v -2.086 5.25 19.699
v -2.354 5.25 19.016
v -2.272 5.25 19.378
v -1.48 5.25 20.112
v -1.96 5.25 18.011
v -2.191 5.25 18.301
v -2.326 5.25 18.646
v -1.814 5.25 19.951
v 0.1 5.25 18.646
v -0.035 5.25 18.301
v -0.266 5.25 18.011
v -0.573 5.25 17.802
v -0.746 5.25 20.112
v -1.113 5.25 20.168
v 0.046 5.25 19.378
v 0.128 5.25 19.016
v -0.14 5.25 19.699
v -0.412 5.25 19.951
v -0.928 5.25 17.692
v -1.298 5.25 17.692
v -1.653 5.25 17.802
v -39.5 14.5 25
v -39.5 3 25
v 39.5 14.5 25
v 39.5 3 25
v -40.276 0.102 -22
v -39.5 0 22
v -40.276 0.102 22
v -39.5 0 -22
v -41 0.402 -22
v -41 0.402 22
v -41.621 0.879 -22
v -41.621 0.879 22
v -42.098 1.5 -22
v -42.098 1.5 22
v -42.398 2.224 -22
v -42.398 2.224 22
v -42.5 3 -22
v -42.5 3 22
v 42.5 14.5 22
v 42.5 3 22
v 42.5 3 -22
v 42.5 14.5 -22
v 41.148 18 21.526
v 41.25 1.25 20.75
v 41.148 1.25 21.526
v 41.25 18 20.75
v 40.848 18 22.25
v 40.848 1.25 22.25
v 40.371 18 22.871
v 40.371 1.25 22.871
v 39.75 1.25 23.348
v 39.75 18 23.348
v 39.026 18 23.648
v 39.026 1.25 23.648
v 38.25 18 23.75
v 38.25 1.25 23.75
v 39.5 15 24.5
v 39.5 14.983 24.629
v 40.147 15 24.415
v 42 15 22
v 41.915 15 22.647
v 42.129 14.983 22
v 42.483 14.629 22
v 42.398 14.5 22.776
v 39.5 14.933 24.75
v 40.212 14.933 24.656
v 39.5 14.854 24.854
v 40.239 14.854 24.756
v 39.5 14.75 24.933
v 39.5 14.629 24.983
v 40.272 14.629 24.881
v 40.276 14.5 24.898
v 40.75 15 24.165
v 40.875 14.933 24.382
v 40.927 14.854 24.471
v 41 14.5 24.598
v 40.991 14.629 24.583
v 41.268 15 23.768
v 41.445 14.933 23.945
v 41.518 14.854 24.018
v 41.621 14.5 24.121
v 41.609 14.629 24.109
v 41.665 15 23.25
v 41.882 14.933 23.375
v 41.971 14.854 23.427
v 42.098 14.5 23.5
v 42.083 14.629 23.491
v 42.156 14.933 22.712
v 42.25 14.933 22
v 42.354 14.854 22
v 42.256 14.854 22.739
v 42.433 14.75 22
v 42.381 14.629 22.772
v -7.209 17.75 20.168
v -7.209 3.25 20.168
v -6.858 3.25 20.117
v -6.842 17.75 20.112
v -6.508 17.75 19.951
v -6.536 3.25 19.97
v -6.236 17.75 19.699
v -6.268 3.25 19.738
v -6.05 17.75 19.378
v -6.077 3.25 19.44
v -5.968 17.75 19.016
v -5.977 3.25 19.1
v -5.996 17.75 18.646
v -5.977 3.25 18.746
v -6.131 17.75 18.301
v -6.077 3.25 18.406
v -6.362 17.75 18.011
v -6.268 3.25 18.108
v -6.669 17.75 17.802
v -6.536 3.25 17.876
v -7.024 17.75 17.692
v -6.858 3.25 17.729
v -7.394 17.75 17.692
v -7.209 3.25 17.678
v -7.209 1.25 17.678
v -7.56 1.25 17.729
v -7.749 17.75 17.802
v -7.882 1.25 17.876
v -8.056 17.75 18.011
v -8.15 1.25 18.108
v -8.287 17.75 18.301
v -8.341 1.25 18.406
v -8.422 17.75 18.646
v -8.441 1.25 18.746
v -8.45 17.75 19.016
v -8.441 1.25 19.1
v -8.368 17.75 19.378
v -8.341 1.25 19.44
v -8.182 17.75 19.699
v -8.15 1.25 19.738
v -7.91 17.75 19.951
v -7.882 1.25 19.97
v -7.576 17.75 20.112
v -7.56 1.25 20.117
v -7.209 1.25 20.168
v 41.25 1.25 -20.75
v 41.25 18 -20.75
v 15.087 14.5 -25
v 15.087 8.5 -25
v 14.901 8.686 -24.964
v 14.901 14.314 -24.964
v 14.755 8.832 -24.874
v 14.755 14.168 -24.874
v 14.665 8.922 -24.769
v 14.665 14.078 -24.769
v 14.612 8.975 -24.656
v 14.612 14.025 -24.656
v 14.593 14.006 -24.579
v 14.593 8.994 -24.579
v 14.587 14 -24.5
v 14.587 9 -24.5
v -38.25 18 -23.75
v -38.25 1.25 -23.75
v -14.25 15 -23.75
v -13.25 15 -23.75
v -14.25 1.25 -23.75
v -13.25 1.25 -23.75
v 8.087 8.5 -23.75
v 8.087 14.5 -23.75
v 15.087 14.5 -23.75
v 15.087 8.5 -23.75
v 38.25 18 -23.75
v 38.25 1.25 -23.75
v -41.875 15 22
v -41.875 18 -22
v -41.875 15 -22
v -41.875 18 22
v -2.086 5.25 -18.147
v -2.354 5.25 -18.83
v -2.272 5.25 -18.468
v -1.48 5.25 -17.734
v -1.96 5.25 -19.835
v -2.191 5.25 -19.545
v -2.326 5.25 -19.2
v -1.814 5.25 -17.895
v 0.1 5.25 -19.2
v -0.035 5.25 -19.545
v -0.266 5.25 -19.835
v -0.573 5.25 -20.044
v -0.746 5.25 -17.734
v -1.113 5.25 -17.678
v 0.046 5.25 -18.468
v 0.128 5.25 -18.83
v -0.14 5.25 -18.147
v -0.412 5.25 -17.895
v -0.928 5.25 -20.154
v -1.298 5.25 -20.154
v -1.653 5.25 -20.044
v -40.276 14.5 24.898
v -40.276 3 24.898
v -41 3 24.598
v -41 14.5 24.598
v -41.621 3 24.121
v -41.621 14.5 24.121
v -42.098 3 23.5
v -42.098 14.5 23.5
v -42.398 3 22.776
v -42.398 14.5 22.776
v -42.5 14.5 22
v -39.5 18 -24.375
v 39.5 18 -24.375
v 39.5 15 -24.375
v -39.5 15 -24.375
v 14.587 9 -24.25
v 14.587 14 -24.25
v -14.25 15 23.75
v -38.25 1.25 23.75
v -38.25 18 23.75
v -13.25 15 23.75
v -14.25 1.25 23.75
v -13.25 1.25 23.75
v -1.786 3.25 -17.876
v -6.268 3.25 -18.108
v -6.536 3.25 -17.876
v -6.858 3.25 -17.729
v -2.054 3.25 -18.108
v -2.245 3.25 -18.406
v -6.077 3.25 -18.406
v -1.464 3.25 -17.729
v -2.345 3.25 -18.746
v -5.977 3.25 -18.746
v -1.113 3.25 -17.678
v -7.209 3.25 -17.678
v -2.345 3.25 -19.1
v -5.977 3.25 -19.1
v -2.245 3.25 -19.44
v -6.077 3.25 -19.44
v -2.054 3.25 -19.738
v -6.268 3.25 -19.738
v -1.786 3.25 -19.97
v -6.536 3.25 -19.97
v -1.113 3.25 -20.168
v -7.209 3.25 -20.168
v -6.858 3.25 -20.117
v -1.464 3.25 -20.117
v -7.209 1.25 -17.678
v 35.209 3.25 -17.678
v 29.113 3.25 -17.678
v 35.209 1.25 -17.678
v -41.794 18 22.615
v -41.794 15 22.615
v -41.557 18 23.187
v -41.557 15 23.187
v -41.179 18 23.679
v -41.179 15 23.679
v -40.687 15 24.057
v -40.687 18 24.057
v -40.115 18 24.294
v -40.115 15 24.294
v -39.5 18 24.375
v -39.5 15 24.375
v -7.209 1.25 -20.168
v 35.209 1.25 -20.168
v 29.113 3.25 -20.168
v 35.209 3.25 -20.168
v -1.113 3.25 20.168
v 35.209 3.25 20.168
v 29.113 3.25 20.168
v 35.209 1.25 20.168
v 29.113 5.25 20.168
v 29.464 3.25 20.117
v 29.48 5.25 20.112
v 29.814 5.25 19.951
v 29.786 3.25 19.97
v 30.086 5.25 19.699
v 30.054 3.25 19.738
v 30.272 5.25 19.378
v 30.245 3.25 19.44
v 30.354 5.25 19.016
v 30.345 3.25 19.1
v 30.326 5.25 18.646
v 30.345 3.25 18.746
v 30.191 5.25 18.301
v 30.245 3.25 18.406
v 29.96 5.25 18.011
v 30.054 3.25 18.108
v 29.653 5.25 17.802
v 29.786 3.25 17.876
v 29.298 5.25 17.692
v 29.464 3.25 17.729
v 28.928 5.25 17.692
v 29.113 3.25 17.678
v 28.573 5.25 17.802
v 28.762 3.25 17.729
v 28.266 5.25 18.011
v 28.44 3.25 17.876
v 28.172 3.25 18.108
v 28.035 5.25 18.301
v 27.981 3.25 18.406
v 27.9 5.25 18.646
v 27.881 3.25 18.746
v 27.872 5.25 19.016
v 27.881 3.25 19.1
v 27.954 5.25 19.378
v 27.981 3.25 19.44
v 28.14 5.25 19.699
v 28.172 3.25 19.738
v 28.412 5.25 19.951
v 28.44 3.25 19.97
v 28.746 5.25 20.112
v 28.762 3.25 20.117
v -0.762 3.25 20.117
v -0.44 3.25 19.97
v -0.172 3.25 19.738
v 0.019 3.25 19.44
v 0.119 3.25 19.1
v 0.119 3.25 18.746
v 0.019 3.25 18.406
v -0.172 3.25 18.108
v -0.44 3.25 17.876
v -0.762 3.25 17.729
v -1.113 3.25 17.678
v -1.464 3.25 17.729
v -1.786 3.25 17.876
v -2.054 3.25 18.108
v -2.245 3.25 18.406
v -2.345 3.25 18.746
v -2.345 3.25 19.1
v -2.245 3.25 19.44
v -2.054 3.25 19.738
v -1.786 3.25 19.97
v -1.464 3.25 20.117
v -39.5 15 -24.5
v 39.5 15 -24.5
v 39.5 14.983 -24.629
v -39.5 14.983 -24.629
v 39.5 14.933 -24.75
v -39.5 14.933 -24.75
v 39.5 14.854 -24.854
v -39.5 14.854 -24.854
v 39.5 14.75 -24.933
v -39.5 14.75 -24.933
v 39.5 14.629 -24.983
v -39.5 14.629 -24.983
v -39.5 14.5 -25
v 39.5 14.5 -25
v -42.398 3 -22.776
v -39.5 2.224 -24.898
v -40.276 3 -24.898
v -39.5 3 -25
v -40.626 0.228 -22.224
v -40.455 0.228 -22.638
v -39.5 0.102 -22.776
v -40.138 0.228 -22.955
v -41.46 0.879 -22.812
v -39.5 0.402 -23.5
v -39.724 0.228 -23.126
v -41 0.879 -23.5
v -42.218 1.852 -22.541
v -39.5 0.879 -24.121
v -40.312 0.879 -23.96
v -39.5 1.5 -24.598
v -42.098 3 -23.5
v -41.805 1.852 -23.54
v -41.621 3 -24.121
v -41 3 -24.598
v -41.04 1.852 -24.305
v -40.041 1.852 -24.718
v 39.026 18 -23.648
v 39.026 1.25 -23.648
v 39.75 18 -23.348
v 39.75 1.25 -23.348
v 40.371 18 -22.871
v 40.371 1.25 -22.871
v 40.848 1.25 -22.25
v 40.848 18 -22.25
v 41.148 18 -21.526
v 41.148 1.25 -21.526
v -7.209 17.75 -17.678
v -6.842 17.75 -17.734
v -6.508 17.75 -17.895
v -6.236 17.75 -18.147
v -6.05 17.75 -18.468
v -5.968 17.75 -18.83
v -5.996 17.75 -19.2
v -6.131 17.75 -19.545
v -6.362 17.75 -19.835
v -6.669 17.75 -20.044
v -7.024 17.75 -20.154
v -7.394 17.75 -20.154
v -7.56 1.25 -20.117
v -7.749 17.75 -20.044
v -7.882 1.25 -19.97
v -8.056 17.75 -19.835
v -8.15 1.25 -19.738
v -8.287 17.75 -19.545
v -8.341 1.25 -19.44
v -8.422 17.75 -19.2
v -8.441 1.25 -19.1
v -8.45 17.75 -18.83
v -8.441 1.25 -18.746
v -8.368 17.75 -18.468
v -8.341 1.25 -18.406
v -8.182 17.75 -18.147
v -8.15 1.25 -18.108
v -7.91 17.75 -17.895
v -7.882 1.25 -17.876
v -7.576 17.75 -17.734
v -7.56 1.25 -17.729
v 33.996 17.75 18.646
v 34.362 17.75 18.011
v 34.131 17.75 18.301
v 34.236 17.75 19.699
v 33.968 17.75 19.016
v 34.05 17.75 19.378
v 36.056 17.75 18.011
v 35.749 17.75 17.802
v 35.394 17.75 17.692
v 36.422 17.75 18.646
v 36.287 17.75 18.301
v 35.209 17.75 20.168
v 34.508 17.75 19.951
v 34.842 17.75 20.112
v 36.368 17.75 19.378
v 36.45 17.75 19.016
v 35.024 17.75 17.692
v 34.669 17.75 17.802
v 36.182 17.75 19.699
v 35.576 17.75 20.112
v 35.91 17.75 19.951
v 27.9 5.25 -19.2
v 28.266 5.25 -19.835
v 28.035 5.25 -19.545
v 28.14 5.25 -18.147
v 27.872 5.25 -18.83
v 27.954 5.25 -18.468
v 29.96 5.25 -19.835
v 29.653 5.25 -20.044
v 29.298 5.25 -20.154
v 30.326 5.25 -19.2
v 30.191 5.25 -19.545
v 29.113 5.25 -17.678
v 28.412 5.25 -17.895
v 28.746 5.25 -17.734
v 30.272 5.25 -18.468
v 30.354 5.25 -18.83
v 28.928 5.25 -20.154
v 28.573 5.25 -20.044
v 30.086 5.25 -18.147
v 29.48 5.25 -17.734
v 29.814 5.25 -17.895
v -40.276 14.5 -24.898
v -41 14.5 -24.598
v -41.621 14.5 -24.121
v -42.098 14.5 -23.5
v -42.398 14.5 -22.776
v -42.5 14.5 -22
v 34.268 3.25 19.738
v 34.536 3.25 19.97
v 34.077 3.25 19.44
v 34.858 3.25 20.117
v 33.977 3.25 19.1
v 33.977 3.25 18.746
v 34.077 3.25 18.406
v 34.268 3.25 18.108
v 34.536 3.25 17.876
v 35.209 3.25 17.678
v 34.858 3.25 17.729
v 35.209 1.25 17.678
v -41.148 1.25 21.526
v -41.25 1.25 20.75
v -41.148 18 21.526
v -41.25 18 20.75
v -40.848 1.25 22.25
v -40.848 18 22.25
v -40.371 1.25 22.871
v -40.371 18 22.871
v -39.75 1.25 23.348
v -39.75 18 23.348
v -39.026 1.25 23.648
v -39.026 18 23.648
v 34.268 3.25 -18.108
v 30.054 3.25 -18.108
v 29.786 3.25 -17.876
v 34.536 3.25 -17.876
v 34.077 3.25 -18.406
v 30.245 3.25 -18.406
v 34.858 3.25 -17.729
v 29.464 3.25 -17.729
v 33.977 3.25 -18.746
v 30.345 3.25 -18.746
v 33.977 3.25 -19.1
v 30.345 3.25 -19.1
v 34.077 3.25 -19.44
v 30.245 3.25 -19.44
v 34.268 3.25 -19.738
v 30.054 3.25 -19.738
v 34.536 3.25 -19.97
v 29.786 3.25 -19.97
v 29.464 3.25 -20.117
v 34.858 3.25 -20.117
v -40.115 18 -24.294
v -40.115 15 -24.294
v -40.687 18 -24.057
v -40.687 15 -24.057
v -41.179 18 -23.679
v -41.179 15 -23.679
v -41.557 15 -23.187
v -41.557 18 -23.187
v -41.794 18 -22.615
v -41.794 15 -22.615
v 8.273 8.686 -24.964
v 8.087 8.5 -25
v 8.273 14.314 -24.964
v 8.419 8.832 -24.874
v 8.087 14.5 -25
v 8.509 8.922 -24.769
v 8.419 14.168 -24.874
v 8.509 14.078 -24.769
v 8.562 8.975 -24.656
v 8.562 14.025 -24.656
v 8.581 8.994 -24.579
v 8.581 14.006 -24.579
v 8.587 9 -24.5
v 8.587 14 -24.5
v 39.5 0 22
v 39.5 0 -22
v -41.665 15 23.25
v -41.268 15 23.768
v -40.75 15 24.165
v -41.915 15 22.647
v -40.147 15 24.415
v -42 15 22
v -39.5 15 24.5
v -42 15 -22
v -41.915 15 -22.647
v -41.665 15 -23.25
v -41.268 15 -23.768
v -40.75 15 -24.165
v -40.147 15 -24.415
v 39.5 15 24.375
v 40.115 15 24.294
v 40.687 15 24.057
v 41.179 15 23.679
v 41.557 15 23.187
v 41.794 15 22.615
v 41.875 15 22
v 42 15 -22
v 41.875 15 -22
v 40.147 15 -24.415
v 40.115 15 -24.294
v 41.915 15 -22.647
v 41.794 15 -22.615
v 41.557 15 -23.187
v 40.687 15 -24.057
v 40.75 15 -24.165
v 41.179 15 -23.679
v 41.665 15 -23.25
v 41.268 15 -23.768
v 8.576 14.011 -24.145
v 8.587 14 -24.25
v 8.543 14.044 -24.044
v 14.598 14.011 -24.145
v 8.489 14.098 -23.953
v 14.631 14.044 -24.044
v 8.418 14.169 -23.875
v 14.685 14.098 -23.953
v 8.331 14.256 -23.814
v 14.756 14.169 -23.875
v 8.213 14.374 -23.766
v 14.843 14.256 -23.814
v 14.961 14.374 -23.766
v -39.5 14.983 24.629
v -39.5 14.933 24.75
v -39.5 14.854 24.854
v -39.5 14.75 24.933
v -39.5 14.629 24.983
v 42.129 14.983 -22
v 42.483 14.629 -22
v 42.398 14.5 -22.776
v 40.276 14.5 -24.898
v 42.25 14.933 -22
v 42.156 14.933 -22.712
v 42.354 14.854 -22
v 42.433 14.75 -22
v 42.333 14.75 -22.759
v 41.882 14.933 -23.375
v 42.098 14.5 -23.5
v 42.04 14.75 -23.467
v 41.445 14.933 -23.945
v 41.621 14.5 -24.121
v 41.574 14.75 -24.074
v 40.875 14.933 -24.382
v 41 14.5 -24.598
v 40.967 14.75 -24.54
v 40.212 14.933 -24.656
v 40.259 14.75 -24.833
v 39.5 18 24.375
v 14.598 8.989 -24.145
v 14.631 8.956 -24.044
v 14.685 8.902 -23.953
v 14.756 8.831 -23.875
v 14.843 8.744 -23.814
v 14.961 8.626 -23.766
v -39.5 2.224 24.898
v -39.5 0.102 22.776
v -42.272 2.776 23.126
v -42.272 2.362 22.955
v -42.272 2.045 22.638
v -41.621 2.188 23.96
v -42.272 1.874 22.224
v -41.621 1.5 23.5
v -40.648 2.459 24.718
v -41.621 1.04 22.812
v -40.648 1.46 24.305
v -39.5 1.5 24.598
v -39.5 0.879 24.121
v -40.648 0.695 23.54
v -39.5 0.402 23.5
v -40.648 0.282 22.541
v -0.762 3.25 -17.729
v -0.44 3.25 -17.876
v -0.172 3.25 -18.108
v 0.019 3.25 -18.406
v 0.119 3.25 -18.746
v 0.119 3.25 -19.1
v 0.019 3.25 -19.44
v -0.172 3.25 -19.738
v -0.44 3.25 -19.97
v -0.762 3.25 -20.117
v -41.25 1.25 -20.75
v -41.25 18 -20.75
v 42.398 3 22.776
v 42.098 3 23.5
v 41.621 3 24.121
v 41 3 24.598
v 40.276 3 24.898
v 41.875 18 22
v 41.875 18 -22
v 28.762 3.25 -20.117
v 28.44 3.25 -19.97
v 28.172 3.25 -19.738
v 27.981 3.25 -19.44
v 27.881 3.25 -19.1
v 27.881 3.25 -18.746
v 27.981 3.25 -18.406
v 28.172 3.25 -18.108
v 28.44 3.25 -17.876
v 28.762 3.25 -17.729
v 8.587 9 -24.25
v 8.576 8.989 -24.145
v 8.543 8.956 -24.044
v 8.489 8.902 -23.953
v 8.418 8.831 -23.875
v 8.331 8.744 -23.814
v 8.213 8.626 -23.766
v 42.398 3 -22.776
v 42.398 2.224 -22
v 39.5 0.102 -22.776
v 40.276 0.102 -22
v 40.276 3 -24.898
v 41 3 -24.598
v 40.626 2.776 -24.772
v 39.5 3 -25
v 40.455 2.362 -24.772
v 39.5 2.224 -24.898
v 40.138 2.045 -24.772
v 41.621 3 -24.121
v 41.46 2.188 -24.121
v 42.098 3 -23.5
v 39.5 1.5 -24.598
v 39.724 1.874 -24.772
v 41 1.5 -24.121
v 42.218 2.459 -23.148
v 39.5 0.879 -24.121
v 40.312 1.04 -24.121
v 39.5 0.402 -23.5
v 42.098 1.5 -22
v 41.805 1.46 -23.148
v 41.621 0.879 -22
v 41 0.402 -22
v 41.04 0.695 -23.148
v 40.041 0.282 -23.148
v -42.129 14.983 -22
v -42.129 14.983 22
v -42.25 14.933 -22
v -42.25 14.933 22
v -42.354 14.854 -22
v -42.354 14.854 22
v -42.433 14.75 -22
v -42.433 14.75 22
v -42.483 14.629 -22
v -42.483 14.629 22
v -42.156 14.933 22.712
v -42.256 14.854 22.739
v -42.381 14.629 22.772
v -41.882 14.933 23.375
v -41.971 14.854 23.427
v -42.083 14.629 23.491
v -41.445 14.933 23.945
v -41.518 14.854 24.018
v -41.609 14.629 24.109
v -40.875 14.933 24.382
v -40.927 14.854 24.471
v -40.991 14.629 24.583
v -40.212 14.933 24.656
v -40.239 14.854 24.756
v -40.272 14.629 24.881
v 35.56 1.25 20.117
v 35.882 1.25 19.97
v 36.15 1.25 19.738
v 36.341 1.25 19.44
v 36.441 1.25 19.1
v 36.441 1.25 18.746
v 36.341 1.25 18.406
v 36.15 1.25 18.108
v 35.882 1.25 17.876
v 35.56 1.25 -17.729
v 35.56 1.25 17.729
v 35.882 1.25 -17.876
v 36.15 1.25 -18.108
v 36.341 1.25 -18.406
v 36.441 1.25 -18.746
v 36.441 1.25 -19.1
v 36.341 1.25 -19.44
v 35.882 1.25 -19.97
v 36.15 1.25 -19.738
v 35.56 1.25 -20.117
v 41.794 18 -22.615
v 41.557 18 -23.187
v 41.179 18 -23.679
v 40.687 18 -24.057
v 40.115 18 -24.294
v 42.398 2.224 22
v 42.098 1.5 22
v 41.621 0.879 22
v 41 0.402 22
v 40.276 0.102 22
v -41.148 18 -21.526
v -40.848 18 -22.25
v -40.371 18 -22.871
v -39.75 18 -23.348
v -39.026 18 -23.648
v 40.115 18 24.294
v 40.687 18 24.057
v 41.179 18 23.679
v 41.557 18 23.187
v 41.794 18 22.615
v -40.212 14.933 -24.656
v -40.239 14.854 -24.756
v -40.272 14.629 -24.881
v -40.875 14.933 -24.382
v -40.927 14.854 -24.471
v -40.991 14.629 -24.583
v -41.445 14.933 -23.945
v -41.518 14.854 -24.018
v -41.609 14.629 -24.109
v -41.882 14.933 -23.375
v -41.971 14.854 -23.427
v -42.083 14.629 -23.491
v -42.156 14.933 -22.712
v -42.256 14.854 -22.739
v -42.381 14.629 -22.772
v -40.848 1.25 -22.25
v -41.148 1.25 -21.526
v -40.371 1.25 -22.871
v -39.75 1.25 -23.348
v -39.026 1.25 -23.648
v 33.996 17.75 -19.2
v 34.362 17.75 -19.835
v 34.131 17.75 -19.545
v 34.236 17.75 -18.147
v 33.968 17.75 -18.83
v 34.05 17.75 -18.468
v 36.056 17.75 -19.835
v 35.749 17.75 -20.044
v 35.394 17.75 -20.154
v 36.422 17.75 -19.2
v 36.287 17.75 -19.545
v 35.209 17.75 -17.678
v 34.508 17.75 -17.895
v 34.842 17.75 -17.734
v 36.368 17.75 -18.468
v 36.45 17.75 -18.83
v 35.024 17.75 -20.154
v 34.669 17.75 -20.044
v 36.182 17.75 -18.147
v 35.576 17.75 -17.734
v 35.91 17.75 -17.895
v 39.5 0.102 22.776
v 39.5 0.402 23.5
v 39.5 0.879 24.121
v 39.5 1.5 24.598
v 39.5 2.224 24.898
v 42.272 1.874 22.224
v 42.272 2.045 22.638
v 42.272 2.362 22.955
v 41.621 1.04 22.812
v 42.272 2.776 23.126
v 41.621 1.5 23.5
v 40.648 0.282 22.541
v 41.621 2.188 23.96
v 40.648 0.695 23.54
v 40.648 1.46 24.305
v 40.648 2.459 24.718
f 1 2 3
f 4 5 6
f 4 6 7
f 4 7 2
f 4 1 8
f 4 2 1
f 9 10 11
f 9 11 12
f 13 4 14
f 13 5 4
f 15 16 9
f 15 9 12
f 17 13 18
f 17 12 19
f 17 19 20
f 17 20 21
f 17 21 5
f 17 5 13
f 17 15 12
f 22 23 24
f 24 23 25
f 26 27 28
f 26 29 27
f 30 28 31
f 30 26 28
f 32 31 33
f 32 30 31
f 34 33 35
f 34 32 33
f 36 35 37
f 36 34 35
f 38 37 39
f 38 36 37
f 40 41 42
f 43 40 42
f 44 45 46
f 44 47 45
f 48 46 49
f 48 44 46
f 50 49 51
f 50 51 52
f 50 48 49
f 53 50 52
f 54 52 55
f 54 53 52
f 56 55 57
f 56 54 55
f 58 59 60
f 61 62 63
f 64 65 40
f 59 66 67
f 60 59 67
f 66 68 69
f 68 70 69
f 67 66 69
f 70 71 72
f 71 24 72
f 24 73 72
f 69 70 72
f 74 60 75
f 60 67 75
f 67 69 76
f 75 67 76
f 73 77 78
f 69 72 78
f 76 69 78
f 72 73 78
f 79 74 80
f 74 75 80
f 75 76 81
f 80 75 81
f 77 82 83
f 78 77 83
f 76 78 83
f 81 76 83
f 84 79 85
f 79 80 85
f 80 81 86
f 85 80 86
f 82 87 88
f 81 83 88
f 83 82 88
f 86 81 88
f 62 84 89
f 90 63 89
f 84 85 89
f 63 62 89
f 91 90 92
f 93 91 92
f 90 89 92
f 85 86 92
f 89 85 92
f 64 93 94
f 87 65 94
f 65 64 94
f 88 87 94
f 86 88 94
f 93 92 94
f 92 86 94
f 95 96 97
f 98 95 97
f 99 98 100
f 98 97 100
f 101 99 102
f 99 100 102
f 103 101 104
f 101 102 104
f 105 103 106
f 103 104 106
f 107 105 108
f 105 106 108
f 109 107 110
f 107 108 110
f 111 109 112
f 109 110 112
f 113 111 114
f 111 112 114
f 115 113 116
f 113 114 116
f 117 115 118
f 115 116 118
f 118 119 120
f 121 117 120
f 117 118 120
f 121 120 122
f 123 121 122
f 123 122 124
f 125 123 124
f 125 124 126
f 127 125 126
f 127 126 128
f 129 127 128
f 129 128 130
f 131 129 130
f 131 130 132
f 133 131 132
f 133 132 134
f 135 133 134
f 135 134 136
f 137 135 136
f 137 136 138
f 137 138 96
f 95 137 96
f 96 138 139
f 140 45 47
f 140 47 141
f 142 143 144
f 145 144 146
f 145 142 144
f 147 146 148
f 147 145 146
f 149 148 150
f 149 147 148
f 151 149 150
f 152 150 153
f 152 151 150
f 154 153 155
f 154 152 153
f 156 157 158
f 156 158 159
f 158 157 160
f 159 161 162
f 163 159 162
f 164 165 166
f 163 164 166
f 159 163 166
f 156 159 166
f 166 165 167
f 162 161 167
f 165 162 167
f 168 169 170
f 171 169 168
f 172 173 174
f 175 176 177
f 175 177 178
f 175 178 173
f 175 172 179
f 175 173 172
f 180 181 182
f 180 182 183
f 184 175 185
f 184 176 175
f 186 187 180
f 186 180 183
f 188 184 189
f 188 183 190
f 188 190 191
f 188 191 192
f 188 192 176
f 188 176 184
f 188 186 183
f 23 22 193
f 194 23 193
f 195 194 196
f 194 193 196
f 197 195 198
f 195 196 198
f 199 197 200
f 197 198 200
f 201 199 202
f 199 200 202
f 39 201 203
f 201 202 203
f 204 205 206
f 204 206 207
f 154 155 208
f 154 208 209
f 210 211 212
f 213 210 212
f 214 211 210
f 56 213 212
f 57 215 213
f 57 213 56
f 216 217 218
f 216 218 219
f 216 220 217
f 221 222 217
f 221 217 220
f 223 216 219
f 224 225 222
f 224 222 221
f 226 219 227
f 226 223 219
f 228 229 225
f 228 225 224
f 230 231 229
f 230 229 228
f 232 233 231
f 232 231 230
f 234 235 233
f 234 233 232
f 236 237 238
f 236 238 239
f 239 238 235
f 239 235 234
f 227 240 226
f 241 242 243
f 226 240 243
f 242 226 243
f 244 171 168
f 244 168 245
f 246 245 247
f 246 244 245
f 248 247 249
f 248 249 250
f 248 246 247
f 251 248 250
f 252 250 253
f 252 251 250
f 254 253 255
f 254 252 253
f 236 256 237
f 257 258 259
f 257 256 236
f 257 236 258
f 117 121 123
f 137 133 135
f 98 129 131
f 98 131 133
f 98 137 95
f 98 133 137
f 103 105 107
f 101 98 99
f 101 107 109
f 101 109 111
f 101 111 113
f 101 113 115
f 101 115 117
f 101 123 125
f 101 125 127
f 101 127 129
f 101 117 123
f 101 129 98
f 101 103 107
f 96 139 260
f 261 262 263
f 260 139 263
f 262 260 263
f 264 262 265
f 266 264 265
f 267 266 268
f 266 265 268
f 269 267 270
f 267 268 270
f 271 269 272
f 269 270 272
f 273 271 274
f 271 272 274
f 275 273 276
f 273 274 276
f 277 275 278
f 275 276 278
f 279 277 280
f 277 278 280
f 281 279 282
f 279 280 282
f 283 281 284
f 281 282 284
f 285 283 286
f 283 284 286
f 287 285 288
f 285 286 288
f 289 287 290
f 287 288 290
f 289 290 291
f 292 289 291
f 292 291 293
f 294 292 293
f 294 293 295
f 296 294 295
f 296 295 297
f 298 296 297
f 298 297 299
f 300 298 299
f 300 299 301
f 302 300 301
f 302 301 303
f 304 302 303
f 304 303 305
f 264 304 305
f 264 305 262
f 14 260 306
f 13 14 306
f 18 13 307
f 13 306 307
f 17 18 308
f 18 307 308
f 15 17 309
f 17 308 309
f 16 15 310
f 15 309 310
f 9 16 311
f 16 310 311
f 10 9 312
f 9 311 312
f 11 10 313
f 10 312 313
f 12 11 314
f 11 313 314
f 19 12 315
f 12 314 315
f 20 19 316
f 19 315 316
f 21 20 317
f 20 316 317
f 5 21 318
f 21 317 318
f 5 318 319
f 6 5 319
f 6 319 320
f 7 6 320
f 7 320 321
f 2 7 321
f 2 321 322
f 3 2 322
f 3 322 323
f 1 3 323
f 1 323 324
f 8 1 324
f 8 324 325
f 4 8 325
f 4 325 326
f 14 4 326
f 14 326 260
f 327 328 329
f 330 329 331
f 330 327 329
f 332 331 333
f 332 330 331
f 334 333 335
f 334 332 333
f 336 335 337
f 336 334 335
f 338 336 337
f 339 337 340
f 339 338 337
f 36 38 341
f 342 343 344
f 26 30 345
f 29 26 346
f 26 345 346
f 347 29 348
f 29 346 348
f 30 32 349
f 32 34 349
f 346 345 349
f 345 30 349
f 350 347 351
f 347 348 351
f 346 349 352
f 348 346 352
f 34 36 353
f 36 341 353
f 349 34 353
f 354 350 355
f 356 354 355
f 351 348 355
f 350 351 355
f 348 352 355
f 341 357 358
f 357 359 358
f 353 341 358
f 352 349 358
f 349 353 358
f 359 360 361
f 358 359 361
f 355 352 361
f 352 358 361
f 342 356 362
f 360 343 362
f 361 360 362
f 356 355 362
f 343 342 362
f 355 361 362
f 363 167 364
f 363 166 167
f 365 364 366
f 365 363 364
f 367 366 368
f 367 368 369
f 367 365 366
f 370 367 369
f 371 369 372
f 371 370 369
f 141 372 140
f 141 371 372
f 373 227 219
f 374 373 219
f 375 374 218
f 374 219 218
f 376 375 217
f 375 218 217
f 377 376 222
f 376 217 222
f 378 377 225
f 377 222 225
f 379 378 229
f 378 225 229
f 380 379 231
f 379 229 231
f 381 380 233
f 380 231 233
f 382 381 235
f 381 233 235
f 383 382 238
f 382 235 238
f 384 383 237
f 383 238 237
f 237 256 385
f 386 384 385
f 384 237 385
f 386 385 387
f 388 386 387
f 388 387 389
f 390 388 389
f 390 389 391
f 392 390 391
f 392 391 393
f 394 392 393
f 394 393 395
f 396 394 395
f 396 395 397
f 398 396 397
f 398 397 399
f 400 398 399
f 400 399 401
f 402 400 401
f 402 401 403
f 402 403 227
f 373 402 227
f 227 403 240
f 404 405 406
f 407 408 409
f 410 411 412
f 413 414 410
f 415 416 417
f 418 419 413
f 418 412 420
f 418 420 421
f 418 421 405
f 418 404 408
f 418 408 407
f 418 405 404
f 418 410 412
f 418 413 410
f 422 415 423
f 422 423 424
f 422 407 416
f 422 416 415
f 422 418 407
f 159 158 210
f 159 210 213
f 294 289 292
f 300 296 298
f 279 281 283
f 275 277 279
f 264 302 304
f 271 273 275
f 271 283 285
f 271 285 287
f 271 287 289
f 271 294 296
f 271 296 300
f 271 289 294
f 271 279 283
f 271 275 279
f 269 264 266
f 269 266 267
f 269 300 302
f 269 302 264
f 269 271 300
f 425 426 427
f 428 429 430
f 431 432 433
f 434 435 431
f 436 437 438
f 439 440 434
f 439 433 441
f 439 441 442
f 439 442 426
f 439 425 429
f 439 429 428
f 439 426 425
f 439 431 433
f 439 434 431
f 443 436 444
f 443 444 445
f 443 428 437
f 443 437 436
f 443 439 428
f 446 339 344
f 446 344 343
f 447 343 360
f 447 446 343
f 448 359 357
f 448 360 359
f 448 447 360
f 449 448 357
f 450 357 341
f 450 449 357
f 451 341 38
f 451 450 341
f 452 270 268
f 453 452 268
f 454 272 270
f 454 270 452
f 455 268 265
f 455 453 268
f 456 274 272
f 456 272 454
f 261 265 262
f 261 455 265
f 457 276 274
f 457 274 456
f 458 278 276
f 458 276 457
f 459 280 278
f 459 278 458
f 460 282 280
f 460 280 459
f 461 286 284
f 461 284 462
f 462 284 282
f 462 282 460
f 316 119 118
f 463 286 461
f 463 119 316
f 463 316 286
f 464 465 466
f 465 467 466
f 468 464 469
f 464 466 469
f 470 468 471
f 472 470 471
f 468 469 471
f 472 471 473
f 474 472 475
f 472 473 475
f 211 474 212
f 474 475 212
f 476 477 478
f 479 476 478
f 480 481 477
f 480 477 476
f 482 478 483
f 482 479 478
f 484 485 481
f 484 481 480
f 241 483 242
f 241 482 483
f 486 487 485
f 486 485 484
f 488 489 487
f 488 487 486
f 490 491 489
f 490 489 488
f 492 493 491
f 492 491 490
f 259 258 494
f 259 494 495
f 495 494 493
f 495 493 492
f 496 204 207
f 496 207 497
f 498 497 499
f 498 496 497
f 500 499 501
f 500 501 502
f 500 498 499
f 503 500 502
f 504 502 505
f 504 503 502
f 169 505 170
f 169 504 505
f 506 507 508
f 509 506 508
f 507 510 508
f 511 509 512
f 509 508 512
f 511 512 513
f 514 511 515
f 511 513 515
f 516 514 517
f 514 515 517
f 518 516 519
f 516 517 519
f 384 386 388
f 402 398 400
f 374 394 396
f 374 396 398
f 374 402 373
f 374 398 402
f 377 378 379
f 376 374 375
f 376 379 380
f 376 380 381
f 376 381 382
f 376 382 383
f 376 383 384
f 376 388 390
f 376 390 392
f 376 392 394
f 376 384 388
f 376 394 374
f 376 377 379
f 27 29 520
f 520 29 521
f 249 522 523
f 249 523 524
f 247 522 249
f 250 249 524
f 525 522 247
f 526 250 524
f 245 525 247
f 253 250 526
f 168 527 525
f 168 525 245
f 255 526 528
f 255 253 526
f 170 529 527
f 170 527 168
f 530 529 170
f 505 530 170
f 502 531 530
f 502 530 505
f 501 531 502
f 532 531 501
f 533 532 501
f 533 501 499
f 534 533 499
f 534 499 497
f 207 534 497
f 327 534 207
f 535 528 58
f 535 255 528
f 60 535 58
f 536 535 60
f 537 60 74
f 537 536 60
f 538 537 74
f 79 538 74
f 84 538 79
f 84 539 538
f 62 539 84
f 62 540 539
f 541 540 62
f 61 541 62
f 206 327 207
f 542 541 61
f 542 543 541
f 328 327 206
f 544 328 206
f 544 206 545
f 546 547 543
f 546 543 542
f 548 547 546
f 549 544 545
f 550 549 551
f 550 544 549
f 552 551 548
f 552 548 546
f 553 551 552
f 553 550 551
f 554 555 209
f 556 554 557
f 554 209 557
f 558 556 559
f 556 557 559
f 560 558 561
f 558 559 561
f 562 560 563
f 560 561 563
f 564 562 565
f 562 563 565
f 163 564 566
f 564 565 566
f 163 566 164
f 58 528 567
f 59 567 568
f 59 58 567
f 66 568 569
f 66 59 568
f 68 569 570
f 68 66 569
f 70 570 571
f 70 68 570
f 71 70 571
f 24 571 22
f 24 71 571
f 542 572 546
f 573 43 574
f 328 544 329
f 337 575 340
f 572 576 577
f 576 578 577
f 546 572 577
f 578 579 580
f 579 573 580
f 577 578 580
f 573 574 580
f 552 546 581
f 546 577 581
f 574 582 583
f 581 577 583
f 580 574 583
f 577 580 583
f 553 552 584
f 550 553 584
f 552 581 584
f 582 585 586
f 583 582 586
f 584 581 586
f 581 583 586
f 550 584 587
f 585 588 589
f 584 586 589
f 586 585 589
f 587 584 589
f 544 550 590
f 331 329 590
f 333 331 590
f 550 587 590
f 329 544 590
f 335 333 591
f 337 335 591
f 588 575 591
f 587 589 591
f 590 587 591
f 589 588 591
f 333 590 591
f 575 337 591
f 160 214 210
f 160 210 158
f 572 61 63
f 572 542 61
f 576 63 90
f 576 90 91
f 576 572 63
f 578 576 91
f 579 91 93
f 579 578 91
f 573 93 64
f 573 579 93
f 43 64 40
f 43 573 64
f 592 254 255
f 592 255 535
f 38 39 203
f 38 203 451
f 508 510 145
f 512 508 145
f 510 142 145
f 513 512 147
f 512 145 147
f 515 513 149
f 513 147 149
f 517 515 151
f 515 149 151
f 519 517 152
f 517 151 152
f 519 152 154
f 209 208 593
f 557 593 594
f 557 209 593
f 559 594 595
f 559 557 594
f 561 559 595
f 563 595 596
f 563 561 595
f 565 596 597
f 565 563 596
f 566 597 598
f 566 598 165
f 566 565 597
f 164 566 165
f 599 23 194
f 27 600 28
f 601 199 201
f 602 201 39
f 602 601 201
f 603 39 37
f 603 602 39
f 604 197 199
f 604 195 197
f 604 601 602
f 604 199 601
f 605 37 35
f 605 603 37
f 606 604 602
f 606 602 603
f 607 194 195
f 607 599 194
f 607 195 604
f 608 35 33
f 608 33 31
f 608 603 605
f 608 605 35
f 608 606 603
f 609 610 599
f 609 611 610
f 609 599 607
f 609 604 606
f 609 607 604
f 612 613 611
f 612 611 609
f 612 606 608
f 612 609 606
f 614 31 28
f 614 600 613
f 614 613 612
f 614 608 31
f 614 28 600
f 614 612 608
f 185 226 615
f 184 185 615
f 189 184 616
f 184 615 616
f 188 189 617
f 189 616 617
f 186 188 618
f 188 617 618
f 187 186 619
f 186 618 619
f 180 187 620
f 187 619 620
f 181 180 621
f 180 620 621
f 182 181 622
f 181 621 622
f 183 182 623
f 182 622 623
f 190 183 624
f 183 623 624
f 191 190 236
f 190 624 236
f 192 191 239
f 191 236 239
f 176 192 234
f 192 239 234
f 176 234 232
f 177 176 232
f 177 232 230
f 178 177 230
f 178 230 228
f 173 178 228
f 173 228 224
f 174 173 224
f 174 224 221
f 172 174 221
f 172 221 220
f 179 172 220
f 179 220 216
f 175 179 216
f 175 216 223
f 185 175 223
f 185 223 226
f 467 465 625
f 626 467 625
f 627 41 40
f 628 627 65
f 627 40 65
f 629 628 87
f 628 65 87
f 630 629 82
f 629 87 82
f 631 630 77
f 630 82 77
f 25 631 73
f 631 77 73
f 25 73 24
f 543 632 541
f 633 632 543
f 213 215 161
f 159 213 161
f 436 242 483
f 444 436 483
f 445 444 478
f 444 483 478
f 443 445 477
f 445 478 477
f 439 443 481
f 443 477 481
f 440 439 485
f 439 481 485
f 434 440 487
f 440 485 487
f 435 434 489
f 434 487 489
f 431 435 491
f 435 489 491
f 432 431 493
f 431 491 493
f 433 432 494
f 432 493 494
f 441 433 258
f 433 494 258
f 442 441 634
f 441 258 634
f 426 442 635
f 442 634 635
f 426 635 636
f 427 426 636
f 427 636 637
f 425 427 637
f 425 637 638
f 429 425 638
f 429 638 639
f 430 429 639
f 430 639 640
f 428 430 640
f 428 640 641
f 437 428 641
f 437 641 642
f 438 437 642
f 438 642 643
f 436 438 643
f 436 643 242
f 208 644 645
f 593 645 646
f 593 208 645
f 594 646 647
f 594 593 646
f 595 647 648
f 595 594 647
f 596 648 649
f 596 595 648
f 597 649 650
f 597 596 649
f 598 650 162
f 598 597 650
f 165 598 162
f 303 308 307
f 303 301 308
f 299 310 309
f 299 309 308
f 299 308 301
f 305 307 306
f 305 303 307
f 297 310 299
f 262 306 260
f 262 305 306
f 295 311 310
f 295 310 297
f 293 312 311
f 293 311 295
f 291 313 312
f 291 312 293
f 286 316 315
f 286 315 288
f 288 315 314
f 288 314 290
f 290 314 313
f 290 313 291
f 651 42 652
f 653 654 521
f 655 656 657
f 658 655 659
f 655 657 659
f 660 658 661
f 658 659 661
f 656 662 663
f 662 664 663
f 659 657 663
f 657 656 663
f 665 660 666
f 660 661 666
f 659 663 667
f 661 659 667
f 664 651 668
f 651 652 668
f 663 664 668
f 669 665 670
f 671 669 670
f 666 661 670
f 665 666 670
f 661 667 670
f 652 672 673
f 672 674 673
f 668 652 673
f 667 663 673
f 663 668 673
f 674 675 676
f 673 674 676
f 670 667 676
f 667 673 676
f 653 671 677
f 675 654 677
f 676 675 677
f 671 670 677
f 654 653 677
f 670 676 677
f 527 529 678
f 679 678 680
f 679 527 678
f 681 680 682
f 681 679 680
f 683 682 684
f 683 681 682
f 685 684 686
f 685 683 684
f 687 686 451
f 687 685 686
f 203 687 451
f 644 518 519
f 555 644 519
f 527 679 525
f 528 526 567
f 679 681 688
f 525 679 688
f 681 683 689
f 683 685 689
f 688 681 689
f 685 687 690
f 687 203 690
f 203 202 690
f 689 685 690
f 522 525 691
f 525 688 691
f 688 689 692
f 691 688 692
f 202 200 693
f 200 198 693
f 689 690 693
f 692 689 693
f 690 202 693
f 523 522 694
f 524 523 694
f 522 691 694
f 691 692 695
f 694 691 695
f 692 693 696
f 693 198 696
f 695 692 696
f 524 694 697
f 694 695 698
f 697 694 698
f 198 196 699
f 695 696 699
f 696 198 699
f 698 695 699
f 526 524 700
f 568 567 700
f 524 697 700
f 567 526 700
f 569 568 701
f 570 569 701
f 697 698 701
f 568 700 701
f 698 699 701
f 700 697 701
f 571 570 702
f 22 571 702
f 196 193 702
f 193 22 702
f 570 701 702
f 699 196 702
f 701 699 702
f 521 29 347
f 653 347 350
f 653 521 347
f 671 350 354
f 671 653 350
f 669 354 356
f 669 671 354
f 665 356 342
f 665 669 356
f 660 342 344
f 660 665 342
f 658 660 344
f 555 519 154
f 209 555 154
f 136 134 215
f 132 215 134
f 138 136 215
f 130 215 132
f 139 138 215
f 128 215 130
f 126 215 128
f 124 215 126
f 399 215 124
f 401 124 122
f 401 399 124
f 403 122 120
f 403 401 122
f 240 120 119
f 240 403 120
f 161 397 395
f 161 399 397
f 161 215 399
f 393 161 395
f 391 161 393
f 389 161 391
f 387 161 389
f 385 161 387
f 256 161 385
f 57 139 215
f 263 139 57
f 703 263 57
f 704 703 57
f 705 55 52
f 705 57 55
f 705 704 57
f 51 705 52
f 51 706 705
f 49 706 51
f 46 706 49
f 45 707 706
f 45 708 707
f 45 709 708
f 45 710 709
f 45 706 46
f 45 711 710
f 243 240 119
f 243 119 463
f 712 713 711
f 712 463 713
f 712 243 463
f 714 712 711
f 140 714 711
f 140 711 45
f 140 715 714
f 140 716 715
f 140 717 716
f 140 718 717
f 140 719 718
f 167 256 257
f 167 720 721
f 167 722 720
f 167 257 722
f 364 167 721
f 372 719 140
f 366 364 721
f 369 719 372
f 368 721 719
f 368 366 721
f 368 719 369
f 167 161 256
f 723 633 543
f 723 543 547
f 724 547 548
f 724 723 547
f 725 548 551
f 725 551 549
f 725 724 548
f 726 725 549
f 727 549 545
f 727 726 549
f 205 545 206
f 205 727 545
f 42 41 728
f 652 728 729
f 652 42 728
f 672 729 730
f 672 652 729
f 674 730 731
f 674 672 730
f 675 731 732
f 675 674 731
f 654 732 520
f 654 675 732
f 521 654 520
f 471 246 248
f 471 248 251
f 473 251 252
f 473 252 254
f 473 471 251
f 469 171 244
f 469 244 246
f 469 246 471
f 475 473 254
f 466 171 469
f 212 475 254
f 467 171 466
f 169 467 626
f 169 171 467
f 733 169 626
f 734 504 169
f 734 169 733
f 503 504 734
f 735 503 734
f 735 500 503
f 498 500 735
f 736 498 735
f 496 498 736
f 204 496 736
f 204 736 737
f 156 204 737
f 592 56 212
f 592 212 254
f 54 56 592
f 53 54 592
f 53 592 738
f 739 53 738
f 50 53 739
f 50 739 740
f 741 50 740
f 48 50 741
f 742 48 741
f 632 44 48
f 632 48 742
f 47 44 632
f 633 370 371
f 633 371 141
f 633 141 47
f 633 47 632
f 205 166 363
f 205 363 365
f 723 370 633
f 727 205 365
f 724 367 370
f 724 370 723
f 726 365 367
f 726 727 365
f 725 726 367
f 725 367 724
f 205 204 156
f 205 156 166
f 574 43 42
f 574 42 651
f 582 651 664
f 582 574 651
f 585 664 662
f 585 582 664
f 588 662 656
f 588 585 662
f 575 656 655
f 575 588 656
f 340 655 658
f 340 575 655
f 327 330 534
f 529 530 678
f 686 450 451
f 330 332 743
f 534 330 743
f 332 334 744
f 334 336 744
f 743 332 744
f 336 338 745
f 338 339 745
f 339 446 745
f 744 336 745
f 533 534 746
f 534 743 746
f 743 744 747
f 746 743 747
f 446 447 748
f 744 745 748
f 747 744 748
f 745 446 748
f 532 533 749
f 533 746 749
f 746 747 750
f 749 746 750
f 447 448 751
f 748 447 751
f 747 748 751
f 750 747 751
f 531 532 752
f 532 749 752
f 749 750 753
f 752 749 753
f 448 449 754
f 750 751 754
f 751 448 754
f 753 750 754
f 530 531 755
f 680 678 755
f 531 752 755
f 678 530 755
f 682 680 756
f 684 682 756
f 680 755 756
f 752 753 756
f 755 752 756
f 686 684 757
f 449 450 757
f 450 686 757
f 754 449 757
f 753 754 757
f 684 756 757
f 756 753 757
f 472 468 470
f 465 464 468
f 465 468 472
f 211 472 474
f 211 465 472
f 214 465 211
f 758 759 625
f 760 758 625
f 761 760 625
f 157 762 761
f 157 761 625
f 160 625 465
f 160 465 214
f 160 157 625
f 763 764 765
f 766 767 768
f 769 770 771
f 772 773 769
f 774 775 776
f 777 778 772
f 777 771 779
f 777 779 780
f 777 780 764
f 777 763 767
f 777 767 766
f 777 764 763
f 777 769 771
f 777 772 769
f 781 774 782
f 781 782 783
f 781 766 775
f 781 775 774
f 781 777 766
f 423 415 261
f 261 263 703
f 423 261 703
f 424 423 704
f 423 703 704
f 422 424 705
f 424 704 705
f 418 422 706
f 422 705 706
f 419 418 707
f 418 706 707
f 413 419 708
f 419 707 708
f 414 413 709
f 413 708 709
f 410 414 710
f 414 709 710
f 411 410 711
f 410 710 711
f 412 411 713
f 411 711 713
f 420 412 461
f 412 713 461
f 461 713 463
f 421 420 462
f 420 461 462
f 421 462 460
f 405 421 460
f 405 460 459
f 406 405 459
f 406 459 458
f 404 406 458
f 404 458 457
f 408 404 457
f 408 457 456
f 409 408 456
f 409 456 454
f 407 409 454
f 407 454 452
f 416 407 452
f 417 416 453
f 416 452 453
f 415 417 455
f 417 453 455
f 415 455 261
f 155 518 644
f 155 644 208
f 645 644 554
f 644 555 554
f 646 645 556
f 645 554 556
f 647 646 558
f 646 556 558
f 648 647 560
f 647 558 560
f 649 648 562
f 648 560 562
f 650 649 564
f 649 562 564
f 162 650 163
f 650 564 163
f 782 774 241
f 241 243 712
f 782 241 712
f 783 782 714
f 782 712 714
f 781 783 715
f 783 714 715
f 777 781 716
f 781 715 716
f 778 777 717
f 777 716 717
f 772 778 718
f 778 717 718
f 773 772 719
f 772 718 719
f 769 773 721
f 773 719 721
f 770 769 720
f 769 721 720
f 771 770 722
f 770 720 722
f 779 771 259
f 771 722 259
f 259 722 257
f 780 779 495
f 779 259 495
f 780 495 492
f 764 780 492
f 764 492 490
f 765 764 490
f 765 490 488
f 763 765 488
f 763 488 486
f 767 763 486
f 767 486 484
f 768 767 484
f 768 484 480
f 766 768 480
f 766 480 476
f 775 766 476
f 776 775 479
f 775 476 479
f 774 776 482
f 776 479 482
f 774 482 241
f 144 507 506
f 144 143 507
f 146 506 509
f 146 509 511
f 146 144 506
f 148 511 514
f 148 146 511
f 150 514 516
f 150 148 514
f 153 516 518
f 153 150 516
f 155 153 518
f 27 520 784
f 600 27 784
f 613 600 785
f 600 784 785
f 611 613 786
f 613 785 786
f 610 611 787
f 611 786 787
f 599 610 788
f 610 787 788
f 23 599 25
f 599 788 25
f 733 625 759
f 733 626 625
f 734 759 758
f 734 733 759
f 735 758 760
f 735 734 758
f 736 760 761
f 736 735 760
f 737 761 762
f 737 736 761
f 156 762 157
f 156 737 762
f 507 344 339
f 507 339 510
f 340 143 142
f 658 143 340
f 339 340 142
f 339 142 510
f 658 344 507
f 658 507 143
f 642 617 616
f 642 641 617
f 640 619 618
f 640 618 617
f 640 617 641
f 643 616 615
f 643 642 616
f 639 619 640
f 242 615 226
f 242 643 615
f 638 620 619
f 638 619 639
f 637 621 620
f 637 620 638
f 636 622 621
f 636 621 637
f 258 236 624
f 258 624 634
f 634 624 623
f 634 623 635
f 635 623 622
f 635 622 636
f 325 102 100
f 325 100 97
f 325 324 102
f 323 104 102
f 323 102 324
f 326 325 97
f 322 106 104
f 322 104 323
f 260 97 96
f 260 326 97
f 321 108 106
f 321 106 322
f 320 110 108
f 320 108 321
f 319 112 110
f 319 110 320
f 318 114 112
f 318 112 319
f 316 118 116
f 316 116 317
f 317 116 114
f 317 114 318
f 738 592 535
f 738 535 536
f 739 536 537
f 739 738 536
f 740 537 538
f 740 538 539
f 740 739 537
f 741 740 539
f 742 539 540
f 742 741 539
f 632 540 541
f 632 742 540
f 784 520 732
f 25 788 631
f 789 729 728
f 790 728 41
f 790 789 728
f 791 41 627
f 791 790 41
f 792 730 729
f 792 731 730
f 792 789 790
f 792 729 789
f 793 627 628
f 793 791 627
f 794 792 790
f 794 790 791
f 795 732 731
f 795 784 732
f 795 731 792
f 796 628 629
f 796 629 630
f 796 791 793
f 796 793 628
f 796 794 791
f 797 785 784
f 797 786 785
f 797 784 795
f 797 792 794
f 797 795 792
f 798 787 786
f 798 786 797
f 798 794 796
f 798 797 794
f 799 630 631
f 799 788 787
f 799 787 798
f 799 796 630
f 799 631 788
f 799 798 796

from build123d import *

# Parameters (mm, degrees)
SKETCH2_W           = 54.5
SKETCH2_H           = 47.5
SKETCH2_W_2         = 1
SKETCH2_W_3         = 27
BOSS_EXTRUDE3_DEPTH = 1.25
SKETCH2_4_W         = 85
SKETCH2_4_H         = 50
SKETCH2_4_W_2       = 82.5
SKETCH2_4_H_2       = 47.5
BOSS_EXTRUDE4_DEPTH = 18
SKETCH2_5_W         = 1
SKETCH2_5_H         = 47.5
BOSS_EXTRUDE5_DEPTH = 15
SKETCH5_R           = 1.2446
BOSS_EXTRUDE6_DEPTH = 16.5
SKETCH6_R           = 1.2446
BOSS_EXTRUDE7_DEPTH = 4
SKETCH7_W           = 42.418
SKETCH7_H           = 2.4892
BOSS_EXTRUDE9_DEPTH = 2
FILLET2_R           = 3
SKETCH10_OUTSIDE_W  = 107.048
SKETCH10_OUTSIDE_H  = 72.048
CUT_EXTRUDE4_DEPTH  = 3
FILLET3_R           = 0.5
SKETCH14_W          = 6
SKETCH14_H          = 5
CUT_EXTRUDE5_DEPTH  = 2
FILLET4_R           = 0.5


with BuildPart() as part:
    # Sketch2 → Boss-Extrude3 (new body)
    with BuildSketch(Plane(origin=(0, 0, 0), x_dir=(1, 0, 0), z_dir=(0, 1, 0))):
        with Locations((14, 0)):
            Rectangle(SKETCH2_W, SKETCH2_H)
        with Locations((-13.75, 0)):
            Rectangle(SKETCH2_W_2, SKETCH2_H)
        with Locations((-27.75, 0)):
            Rectangle(SKETCH2_W_3, SKETCH2_H)
    extrude(amount=BOSS_EXTRUDE3_DEPTH)

    # Sketch2<4> → Boss-Extrude4 (add)
    with BuildSketch(Plane(origin=(0, 0, 0), x_dir=(1, 0, 0), z_dir=(0, 1, 0))):
        Rectangle(SKETCH2_4_W, SKETCH2_4_H)
        Rectangle(SKETCH2_4_W_2, SKETCH2_4_H_2, mode=Mode.SUBTRACT)
    extrude(amount=BOSS_EXTRUDE4_DEPTH)

    # Sketch2<5> → Boss-Extrude5 (add)
    with BuildSketch(Plane(origin=(0, 0, 0), x_dir=(1, 0, 0), z_dir=(0, 1, 0))):
        with Locations((-13.75, 0)):
            Rectangle(SKETCH2_5_W, SKETCH2_5_H)
    extrude(amount=BOSS_EXTRUDE5_DEPTH)

    # Sketch5 → Boss-Extrude6 (add)
    with BuildSketch(Plane(origin=(0, 1.25, 0), x_dir=(1, 0, 0), z_dir=(0, 1, 0))):
        with Locations(Location((-7.209, 18.923, 0), (0, 0, 270))):
            Circle(SKETCH5_R)
        with Locations(Location((35.209, 18.923, 0), (0, 0, 270))):
            Circle(SKETCH5_R)
        with Locations(Location((-7.209, -18.923, 0), (0, 0, 270))):
            Circle(SKETCH5_R)
        with Locations(Location((35.209, -18.923, 0), (0, 0, 270))):
            Circle(SKETCH5_R)
    extrude(amount=BOSS_EXTRUDE6_DEPTH)

    # Sketch6 → Boss-Extrude7 (add)
    with BuildSketch(Plane(origin=(0, 1.25, 0), x_dir=(1, 0, 0), z_dir=(0, 1, 0))):
        with Locations(Location((-1.113, 18.923, 0), (0, 0, 270))):
            Circle(SKETCH6_R)
        with Locations(Location((29.113, 18.923, 0), (0, 0, 270))):
            Circle(SKETCH6_R)
        with Locations(Location((-1.113, -18.923, 0), (0, 0, 270))):
            Circle(SKETCH6_R)
        with Locations(Location((29.113, -18.923, 0), (0, 0, 270))):
            Circle(SKETCH6_R)
    extrude(amount=BOSS_EXTRUDE7_DEPTH)

    # Sketch7 → Boss-Extrude9 (add)
    with BuildSketch(Plane(origin=(0, 1.25, 0), x_dir=(1, 0, 0), z_dir=(0, 1, 0))):
        with Locations((14, -18.923)):
            Rectangle(SKETCH7_W, SKETCH7_H)
        with Locations((14, 18.923)):
            Rectangle(SKETCH7_W, SKETCH7_H)
    extrude(amount=BOSS_EXTRUDE9_DEPTH)

    # Fillet2
    fillet2_edges = [part.edges().sort_by_distance(p)[0] for p in [
        (41.25, 9.625, 23.75),
        (-41.25, 9.625, 23.75),
        (-41.25, 9.625, -23.75),
        (0, 0, 25),
        (-42.5, 9, 25),
        (42.5, 0, 0),
        (42.5, 9, 25),
        (42.5, 9, -25),
        (-42.5, 9, -25),
        (41.25, 9.625, -23.75),
        (-42.5, 0, 0),
        (0, 0, -25),
    ]]
    fillet(fillet2_edges, radius=FILLET2_R)

    # Sketch10 outside → Cut-Extrude4 (cut)
    with BuildSketch(Plane(origin=(0, 18, 0), x_dir=(1, 0, 0), z_dir=(0, 1, 0))):
        Rectangle(SKETCH10_OUTSIDE_W, SKETCH10_OUTSIDE_H)
        with BuildLine():
            Line((-41.875, 22), (-41.875, -22))
            ThreePointArc((-41.875, -22), (-41.179378605, -23.679378605), (-39.5, -24.375))
            Line((-39.5, -24.375), (39.5, -24.375))
            ThreePointArc((39.5, -24.375), (41.179378605, -23.679378605), (41.875, -22))
            Line((41.875, -22), (41.875, 22))
            ThreePointArc((41.875, 22), (41.179378605, 23.679378605), (39.5, 24.375))
            Line((39.5, 24.375), (-39.5, 24.375))
            ThreePointArc((-39.5, 24.375), (-41.179378605, 23.679378605), (-41.875, 22))
        make_face(mode=Mode.SUBTRACT)
    extrude(amount=-CUT_EXTRUDE4_DEPTH, mode=Mode.SUBTRACT)

    # Fillet3
    fillet3_edges = [part.edges().sort_by_distance(p)[0] for p in [
        (41.621320344, 15, -24.121320344),
        (0, 15, 25),
        (42.5, 15, 0),
        (-41.621320344, 15, 24.121320344),
        (-42.5, 15, 0),
        (-41.621320344, 15, -24.121320344),
        (0, 15, -25),
        (41.621320344, 15, 24.121320344),
    ]]
    fillet(fillet3_edges, radius=FILLET3_R)

    # Sketch14 → Cut-Extrude5 (cut)
    with BuildSketch(Plane.XY.offset(-25)):
        with Locations((11.587, 11.5)):
            Rectangle(SKETCH14_W, SKETCH14_H)
    extrude(amount=CUT_EXTRUDE5_DEPTH, mode=Mode.SUBTRACT)

    # Fillet4
    fillet4_edges = [part.edges().sort_by_distance(p)[0] for p in [
        (8.587, 11.5, -23.75),
        (11.587, 9, -23.75),
        (14.587, 11.5, -25),
        (11.587, 14, -25),
        (14.587, 11.5, -23.75),
        (11.587, 14, -23.75),
        (8.587, 11.5, -25),
        (11.587, 9, -25),
    ]]
    fillet(fillet4_edges, radius=FILLET4_R - 0.0001)  # a hair under: the kernel refuses the full size


solid = part.part
